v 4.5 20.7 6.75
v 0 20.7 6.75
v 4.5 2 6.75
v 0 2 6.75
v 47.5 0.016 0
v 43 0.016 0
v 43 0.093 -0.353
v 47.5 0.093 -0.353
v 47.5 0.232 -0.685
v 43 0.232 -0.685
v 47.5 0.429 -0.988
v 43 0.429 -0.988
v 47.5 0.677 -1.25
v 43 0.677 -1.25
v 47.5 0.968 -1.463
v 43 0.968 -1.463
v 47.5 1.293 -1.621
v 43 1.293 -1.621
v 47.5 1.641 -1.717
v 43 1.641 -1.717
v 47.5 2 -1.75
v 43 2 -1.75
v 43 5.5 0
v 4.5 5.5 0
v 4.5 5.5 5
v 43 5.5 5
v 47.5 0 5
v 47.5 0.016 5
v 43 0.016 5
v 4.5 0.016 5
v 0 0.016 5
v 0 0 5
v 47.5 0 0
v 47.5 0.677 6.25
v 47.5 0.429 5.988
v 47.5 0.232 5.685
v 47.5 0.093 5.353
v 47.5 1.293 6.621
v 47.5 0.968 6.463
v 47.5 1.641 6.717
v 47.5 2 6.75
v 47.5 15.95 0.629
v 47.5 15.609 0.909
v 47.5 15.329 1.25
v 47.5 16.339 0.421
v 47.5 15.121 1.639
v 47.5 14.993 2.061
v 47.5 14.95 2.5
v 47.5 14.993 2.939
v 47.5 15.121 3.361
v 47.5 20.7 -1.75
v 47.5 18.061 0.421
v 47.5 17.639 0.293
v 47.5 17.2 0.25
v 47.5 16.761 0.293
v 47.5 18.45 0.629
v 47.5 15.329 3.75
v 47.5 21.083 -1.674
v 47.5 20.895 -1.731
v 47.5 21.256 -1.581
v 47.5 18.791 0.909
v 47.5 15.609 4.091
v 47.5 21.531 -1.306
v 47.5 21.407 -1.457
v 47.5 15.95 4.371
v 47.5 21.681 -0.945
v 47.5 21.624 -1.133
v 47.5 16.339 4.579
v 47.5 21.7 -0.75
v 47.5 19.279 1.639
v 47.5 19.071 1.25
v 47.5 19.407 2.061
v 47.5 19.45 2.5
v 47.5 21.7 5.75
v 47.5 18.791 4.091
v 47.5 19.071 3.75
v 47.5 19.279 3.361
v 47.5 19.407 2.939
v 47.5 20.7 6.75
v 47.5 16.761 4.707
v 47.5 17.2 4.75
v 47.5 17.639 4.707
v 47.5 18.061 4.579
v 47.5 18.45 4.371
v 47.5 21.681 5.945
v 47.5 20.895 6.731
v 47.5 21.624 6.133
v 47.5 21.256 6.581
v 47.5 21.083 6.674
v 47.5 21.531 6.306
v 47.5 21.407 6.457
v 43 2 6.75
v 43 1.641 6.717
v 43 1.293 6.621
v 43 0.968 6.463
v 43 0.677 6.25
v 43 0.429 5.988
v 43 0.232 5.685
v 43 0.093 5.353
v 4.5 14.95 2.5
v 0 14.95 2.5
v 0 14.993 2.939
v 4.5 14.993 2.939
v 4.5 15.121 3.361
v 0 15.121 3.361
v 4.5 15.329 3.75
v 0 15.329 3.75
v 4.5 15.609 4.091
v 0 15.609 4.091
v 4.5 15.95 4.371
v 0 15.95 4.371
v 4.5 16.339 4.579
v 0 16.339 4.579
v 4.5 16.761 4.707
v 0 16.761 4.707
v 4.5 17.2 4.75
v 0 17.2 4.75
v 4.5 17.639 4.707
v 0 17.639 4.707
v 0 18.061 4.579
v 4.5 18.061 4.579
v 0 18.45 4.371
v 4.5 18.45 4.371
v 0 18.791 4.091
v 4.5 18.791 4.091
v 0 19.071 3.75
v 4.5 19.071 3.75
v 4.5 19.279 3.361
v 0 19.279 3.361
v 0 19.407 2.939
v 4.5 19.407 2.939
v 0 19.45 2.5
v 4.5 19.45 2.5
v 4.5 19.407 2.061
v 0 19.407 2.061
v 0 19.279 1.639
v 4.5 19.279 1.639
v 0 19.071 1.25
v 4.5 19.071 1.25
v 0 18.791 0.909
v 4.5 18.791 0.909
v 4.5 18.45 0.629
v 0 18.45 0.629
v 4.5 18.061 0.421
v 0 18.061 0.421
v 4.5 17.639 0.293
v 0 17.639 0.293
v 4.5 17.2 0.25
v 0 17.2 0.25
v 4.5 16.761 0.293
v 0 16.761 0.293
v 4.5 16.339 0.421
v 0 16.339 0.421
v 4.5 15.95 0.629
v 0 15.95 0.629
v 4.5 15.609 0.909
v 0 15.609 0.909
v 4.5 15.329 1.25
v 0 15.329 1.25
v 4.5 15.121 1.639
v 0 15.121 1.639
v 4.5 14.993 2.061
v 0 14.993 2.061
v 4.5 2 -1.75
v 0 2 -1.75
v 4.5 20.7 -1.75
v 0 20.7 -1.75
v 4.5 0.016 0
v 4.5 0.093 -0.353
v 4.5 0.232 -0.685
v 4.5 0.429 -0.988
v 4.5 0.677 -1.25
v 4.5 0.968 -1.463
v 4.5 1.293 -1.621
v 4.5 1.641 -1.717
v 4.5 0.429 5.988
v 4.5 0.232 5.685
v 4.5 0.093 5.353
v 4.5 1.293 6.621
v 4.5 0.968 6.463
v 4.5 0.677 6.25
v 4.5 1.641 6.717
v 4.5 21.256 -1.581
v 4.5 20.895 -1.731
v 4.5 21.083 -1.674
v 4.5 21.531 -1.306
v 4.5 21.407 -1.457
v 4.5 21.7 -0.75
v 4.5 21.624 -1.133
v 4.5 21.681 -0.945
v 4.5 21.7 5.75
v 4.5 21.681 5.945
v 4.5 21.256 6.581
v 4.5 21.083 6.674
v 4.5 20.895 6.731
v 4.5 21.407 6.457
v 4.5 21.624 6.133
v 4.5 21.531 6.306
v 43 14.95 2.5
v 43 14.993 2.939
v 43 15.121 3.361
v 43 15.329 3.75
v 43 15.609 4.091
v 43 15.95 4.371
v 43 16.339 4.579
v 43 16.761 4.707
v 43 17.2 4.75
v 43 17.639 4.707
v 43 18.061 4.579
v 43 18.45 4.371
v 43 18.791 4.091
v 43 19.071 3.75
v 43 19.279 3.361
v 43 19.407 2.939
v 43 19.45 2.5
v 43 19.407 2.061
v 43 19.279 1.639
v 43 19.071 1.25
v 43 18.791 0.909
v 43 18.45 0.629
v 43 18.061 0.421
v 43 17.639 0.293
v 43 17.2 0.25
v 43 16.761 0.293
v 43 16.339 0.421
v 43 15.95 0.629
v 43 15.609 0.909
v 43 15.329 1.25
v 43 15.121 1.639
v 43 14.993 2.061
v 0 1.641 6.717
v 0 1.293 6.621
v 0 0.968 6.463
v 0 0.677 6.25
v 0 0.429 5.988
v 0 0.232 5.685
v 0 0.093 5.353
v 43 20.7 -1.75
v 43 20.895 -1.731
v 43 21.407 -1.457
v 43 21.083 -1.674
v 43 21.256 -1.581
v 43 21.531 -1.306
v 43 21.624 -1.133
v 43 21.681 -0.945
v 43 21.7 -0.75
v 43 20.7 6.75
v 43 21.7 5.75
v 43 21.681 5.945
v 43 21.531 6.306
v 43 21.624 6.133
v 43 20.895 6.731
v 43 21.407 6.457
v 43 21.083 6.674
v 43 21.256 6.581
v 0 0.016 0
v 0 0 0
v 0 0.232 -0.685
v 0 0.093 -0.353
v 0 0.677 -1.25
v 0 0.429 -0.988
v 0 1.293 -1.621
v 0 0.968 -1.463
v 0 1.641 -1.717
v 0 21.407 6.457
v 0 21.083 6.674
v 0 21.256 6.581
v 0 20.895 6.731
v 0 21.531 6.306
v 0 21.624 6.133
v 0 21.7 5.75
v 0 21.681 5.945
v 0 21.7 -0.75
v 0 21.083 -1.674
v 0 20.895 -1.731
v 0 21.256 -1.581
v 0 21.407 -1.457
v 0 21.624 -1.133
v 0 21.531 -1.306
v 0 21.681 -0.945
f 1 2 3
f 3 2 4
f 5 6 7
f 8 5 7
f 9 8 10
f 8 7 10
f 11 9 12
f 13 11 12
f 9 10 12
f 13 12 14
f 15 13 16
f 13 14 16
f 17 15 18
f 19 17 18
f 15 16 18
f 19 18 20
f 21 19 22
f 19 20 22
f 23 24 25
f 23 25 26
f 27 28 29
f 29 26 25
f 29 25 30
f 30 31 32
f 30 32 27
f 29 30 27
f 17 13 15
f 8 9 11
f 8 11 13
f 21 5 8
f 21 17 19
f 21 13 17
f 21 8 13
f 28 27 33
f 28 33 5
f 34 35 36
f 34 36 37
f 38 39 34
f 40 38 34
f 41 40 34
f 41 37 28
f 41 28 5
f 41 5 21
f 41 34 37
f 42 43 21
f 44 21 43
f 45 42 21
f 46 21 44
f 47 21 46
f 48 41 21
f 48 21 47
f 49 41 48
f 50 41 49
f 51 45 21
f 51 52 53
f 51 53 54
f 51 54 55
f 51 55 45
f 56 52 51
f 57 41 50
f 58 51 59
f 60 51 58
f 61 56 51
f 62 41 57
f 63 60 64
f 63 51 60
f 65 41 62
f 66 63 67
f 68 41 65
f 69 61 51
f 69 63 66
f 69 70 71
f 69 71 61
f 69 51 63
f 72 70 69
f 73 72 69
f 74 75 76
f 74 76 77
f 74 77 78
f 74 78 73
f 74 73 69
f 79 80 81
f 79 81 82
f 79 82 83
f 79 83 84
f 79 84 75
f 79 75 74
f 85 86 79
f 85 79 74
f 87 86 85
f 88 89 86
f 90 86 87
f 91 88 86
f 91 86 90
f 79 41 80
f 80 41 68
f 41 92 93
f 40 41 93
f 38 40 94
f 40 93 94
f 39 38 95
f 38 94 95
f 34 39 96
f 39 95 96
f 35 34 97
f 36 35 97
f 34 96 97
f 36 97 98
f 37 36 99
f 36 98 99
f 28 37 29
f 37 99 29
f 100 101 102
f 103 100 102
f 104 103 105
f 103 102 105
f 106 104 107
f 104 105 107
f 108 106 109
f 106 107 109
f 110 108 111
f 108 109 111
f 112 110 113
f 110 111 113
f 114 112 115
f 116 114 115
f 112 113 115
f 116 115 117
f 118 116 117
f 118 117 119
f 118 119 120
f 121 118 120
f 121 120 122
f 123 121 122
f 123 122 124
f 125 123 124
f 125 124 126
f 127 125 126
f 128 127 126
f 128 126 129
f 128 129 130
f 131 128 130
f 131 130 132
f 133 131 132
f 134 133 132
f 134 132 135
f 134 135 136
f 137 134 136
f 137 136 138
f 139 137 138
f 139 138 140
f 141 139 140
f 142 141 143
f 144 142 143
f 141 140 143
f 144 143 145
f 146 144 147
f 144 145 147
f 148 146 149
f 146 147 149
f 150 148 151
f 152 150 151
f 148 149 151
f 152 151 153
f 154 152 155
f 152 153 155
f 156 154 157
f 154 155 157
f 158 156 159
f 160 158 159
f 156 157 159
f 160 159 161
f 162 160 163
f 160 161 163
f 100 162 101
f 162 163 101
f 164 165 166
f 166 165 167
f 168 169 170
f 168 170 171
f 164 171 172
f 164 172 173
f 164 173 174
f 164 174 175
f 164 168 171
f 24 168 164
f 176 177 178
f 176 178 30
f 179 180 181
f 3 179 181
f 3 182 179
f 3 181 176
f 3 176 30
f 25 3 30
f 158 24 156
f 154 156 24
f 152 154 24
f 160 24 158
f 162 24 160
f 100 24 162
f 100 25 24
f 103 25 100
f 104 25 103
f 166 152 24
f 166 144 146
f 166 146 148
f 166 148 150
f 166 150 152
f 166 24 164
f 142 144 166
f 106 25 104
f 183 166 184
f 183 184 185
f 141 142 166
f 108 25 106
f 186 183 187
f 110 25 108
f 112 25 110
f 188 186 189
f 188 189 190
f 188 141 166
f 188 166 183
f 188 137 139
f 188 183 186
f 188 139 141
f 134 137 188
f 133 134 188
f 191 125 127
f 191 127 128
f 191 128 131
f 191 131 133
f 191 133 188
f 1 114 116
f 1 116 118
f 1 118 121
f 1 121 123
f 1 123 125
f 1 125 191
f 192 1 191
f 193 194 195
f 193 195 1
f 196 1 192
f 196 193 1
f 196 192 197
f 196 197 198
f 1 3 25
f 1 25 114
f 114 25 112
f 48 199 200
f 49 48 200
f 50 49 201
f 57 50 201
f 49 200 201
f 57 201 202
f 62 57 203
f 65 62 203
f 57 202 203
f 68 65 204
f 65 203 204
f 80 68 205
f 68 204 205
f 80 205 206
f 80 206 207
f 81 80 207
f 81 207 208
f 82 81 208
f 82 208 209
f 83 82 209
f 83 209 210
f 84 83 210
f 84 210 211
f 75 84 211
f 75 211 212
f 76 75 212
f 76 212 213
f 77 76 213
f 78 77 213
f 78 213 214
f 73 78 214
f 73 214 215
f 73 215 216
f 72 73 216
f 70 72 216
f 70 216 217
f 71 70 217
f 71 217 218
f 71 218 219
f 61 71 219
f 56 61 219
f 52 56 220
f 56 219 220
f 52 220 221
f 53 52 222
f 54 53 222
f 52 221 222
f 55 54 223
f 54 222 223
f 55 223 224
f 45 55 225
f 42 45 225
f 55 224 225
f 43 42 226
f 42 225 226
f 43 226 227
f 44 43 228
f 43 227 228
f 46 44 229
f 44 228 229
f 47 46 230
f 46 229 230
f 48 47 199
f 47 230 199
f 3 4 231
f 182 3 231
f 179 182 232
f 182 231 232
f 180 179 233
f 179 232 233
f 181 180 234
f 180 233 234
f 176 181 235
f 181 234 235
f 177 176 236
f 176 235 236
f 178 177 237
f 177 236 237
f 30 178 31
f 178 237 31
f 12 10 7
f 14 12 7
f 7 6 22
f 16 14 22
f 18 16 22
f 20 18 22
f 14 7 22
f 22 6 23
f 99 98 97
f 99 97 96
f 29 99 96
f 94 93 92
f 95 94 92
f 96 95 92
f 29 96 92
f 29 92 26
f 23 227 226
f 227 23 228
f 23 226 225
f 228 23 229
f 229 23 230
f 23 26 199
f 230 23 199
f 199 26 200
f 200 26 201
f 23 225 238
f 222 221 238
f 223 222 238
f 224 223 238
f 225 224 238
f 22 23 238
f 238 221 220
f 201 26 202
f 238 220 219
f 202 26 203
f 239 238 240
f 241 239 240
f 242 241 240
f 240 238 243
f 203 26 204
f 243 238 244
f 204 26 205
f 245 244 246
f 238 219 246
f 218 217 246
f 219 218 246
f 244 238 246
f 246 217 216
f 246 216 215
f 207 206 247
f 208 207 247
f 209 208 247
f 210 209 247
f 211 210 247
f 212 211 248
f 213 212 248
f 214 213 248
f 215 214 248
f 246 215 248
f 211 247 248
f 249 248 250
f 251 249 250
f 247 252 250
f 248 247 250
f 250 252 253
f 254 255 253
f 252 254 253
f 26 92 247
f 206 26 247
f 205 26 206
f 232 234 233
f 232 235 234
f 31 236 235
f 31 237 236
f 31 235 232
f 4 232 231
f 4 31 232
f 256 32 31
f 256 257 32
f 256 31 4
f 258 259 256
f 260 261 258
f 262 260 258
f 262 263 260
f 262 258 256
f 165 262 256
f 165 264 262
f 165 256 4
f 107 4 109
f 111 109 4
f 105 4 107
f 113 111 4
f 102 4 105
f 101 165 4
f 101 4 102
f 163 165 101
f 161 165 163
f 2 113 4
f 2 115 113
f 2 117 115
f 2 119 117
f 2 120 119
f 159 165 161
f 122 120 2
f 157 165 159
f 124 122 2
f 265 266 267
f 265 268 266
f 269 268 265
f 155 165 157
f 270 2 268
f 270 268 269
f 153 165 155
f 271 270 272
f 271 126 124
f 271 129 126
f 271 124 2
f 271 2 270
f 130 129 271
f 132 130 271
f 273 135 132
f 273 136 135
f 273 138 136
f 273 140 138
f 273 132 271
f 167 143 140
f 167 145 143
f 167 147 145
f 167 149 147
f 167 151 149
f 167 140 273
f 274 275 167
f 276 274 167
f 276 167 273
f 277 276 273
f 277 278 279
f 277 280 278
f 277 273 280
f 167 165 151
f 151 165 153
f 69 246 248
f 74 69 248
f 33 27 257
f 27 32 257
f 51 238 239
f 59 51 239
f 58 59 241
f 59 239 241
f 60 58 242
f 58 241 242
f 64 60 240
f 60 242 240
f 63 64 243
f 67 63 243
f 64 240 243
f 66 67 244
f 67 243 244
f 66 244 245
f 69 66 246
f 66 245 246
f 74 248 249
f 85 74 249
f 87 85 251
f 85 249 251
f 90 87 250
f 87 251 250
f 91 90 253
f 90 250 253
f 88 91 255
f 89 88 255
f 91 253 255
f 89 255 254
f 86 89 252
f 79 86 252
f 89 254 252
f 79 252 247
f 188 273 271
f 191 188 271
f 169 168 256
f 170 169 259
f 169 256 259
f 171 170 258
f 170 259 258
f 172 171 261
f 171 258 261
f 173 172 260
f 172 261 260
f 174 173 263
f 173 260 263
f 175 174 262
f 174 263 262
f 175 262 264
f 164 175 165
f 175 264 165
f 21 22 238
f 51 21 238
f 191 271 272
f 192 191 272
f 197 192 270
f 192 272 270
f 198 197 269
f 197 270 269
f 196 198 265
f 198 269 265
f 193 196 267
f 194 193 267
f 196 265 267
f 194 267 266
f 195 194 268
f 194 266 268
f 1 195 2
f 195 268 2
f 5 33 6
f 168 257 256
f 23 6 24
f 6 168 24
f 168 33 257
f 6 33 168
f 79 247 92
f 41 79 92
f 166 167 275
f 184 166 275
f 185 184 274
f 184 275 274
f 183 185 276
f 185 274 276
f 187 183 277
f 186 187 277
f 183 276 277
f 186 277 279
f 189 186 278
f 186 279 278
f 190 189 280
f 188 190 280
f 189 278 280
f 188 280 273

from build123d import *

# Parameters (mm, degrees)
F0_W     = 43
F0_H     = 5.5
F1_DEPTH = 5
F3_DEPTH = 4.5
F5_DEPTH = 4.5
F6_R     = 2.25
F7_DEPTH = 47.501


with BuildPart() as f1:
    # F0 (on Top) → F1 (new body)
    with BuildSketch(Plane.XY):
        with Locations((21.5, 2.75)):
            Rectangle(F0_W, F0_H)
    extrude(amount=F1_DEPTH)

    # F2 (on Right) → F3 (join)
    with BuildSketch(Plane.YZ):
        with BuildLine():
            ThreePointArc((0, 0.25), (0.585786, -1.164214), (2, -1.75))
            Line((2, -1.75), (20.7, -1.75))
            ThreePointArc((20.7, -1.75), (21.407107, -1.457107), (21.7, -0.75))
            Line((21.7, -0.75), (21.7, 5.75))
            ThreePointArc((21.7, 5.75), (21.407107, 6.457107), (20.7, 6.75))
            Line((20.7, 6.75), (2, 6.75))
            ThreePointArc((2, 6.75), (0.585786, 6.164214), (0, 4.75))
            Line((0, 4.75), (0, 0.25))
        make_face()
    extrude(amount=F3_DEPTH)

    # F4 (on face) → F5 (join)
    with BuildSketch(Plane.YZ.offset(43)):
        with BuildLine():
            Line((0.015687, 5), (0, 5))
            Line((0, 5), (0, 0))
            Line((0, 0), (0.015687, 0))
            ThreePointArc((0.015687, 0), (0.677124, -1.25), (2, -1.75))
            Line((2, -1.75), (20.7, -1.75))
            ThreePointArc((20.7, -1.75), (21.407107, -1.457107), (21.7, -0.75))
            Line((21.7, -0.75), (21.7, 5.75))
            ThreePointArc((21.7, 5.75), (21.407107, 6.457107), (20.7, 6.75))
            Line((20.7, 6.75), (2, 6.75))
            ThreePointArc((2, 6.75), (0.677124, 6.25), (0.015687, 5))
        make_face()
    extrude(amount=F5_DEPTH)

    # F6 (on face) → F7 (cut, through all)
    with BuildSketch(Plane(origin=(0, 0, 0), x_dir=(0, -1, 0), z_dir=(-1, 0, 0))):
        with Locations((-17.2, 2.5)):
            Circle(F6_R)
    extrude(amount=-F7_DEPTH, mode=Mode.SUBTRACT)


solid = f1.part
